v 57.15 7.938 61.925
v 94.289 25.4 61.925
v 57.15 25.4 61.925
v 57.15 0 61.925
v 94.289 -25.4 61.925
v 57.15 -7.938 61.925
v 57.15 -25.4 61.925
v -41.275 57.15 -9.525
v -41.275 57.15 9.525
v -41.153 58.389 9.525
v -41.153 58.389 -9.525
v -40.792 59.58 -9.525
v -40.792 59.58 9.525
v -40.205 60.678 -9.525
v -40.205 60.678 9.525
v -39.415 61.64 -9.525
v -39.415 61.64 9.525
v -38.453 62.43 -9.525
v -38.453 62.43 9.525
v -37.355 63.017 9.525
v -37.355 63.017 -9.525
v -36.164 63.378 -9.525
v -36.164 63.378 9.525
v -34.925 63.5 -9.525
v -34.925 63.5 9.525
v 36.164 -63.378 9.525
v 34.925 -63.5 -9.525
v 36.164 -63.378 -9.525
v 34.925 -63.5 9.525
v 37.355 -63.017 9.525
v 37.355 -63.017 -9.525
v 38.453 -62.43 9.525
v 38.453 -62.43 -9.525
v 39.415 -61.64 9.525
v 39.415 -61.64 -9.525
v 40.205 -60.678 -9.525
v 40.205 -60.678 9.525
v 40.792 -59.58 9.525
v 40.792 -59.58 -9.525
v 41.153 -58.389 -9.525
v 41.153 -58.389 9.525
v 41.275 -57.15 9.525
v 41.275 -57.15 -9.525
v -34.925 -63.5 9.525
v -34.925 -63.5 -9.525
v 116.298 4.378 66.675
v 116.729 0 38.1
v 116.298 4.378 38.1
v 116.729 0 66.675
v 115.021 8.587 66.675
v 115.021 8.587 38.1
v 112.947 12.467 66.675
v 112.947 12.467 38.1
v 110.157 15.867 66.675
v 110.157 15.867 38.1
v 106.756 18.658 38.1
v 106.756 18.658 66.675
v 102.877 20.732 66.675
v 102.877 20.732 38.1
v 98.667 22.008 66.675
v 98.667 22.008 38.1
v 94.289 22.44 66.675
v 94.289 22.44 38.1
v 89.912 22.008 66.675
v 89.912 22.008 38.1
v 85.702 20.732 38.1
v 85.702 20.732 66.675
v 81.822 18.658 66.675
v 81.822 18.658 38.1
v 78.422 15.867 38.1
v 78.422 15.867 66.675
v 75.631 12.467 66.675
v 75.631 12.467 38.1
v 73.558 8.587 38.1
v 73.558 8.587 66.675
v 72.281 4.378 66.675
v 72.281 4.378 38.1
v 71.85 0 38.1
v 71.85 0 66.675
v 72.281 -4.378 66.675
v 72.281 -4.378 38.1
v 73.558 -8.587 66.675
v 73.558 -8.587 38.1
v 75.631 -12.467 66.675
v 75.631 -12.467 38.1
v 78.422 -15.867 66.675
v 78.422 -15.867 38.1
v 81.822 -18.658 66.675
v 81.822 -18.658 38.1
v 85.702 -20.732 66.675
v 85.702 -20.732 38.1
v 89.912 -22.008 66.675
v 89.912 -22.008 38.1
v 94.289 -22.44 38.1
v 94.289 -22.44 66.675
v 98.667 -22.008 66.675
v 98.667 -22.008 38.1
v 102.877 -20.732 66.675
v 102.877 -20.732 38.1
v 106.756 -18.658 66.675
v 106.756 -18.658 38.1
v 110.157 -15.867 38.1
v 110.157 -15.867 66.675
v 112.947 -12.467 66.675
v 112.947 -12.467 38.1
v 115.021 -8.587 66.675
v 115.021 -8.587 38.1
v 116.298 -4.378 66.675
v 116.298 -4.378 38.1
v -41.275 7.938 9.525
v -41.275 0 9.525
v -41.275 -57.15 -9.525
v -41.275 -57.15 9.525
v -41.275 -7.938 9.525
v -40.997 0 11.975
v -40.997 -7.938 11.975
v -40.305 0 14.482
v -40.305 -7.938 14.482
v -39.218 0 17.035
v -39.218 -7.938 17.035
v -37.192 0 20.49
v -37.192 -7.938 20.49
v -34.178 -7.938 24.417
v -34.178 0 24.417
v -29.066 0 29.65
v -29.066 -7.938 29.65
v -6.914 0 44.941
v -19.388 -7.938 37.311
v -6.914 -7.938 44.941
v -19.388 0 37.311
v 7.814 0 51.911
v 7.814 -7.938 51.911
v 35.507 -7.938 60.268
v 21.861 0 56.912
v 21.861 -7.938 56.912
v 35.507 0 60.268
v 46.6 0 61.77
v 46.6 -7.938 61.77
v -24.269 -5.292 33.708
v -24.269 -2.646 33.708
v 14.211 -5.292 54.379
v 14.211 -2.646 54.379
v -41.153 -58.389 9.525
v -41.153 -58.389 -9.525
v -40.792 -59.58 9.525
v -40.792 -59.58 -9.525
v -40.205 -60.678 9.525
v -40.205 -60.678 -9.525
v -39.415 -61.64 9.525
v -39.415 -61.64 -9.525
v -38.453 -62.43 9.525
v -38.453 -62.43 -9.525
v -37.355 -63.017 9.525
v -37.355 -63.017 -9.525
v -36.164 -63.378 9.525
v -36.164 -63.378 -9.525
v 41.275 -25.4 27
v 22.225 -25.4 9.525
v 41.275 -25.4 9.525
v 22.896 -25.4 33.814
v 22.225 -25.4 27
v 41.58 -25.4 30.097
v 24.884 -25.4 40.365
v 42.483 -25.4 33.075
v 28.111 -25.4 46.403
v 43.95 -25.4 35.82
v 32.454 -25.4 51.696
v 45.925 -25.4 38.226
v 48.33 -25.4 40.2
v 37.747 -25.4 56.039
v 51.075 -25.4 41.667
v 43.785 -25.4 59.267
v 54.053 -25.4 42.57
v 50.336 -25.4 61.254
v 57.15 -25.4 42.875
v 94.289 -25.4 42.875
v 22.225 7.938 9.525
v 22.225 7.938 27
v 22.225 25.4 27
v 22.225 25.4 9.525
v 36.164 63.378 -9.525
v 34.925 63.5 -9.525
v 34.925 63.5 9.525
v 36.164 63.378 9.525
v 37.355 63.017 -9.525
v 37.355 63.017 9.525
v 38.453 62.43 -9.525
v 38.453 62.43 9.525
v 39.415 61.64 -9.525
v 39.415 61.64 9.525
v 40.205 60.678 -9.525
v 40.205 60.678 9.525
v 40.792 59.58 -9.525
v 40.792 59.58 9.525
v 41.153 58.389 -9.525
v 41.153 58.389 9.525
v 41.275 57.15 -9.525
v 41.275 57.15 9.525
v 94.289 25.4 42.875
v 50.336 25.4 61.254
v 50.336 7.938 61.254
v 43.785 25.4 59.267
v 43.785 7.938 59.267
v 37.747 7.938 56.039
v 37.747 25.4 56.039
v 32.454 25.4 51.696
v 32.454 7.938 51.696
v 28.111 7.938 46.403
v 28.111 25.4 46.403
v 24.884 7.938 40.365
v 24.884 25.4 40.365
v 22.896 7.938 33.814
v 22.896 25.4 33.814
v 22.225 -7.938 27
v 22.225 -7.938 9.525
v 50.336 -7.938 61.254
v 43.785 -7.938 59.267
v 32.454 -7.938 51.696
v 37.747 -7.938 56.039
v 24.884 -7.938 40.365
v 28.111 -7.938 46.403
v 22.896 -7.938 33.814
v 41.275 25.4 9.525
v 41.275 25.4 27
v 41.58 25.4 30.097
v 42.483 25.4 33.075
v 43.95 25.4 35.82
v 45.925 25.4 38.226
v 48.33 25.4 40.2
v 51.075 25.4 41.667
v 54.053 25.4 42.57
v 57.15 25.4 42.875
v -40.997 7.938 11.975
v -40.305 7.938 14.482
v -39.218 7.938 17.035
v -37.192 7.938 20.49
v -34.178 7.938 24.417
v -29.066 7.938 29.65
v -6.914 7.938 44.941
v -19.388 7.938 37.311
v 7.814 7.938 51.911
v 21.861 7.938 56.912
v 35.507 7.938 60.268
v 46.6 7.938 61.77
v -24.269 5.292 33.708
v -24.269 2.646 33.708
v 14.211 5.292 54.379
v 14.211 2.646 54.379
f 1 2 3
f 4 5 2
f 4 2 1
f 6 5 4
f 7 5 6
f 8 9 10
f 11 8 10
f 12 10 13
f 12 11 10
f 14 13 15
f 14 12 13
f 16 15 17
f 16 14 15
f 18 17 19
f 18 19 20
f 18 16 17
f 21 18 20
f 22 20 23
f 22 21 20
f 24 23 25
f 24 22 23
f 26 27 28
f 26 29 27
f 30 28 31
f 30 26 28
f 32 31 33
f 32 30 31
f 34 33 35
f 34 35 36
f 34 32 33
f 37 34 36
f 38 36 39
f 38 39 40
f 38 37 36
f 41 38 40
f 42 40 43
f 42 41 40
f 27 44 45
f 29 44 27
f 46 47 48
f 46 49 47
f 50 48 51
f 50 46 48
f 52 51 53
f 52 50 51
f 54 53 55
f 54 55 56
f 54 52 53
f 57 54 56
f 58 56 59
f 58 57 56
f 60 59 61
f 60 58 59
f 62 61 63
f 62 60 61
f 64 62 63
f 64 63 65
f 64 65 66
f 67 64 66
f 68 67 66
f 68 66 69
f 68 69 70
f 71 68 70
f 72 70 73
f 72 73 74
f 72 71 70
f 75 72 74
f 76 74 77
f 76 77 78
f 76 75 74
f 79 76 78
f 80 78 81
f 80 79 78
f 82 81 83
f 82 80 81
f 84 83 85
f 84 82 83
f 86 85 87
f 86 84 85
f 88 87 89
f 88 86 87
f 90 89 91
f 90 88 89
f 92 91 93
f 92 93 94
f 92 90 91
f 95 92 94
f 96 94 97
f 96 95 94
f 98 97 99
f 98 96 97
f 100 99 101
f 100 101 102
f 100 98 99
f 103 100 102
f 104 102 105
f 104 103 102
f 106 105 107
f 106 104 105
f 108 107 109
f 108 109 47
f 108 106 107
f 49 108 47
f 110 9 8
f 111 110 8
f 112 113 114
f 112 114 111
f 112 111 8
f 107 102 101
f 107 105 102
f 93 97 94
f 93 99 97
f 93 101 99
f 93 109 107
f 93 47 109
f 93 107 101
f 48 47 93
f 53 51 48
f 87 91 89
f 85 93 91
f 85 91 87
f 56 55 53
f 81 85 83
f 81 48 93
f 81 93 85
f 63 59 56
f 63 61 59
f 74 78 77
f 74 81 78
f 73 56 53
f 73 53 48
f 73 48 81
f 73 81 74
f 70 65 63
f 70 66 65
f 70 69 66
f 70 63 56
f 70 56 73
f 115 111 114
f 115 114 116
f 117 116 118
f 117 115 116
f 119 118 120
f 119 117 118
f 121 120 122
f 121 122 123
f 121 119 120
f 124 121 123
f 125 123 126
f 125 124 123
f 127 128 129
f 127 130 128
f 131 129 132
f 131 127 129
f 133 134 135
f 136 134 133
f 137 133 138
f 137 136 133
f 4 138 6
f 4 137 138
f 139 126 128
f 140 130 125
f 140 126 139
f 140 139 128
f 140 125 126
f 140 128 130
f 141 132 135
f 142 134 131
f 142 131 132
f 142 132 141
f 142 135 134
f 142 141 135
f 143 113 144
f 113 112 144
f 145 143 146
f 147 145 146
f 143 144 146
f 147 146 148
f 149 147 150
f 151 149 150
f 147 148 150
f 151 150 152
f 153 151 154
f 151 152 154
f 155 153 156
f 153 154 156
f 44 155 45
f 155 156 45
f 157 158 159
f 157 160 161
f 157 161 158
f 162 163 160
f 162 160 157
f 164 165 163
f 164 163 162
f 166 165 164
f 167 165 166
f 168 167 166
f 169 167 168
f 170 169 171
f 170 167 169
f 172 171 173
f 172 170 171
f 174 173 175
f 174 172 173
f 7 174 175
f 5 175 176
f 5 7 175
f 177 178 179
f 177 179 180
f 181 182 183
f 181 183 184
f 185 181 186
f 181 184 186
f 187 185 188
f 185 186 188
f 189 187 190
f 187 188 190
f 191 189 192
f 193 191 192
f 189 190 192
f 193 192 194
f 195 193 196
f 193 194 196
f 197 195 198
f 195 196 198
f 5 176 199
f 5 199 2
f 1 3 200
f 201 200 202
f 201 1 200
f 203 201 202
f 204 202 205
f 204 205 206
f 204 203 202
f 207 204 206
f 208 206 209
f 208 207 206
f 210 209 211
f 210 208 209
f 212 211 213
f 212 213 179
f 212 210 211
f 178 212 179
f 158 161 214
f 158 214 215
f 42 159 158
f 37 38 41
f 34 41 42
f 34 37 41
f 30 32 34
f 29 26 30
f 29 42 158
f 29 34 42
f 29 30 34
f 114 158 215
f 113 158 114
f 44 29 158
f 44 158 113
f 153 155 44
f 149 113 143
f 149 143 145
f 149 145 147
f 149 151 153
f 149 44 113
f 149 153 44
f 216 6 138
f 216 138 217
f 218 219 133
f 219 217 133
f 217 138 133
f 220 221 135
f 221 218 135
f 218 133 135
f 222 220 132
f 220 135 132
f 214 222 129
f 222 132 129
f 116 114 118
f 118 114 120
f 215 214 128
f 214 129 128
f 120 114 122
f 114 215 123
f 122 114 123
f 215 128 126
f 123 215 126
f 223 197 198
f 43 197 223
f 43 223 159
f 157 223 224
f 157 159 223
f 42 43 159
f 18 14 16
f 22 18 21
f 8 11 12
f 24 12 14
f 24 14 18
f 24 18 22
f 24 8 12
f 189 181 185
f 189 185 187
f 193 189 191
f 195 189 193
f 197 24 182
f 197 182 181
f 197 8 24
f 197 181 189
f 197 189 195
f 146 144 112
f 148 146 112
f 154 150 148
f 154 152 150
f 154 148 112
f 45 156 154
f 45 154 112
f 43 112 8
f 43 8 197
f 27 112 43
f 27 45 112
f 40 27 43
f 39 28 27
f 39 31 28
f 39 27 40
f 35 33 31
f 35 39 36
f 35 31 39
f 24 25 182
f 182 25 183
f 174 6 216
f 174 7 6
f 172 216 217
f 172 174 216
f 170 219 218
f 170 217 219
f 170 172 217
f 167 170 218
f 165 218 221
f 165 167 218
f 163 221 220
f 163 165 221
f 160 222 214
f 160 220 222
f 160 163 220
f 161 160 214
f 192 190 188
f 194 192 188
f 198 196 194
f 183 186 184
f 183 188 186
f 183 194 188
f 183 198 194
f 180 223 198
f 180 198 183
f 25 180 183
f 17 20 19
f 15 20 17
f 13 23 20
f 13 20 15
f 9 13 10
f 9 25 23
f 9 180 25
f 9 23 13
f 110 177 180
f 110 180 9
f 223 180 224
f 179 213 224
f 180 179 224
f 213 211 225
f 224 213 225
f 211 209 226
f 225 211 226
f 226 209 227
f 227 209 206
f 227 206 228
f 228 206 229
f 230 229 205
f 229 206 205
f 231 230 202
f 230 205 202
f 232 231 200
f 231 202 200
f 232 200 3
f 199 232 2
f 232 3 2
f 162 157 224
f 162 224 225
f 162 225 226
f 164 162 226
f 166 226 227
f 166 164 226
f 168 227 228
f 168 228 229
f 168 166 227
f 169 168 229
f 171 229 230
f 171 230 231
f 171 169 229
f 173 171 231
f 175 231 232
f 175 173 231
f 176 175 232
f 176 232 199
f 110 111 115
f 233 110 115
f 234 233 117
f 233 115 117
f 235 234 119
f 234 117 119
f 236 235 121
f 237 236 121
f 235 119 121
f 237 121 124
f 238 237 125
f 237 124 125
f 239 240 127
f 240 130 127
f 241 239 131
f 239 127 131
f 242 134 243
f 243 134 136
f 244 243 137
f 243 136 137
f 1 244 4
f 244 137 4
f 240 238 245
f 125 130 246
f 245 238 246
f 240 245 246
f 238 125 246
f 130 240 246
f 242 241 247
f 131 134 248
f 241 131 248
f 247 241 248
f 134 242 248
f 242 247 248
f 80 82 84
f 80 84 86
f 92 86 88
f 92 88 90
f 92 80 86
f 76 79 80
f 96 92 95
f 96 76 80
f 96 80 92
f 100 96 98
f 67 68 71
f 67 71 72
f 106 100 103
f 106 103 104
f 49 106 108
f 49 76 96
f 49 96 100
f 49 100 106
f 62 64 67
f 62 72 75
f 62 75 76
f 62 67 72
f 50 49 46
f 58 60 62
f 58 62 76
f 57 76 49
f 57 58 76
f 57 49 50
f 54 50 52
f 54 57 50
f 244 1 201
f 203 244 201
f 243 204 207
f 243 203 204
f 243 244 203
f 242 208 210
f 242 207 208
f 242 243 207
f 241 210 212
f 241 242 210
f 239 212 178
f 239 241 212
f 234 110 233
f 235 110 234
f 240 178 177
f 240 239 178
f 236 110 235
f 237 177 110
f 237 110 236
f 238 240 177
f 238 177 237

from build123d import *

# Parameters (mm, degrees)
F1_DEPTH = 63.5
F0_W     = 28.3603538342
F0_H     = 19.05
F2_DEPTH = 25.4
F3_DEPTH = 7.9375
F5_R     = 6.35


with BuildPart() as f1:
    # F0 (on Front) → F1 (new body, symmetric)
    with BuildSketch(Plane.XZ):
        Polygon((-41.275, 9.525), (-41.275, -9.525), (41.275, -9.525), (41.275, 9.525), (22.225, 9.525), align=None)
    extrude(amount=F1_DEPTH, both=True)

    # F0 (on Front) → F2 (join, symmetric)
    with BuildSketch(Plane.XZ):
        with BuildLine():
            Line((22.225, 9.525), (41.275, 9.525))
            Line((41.275, 9.525), (41.275, 27.0002))
            ThreePointArc((41.275, 27.0002), (45.9246798487, 38.2255201513), (57.15, 42.8752))
            Line((57.15, 42.8752), (65.9289314961, 42.8752))
            Line((65.9289314961, 42.8752), (65.9289314961, 61.9252))
            Line((65.9289314961, 61.9252), (57.15, 61.9252))
            ThreePointArc((57.15, 61.9252), (32.4542956671, 51.6959043329), (22.225, 27.0002))
            Line((22.225, 27.0002), (22.225, 9.525))
        make_face()
        with Locations((80.1091084132, 52.4002)):
            Rectangle(F0_W, F0_H)
    extrude(amount=F2_DEPTH, both=True)

    # F0 (on Front) → F3 (join, symmetric)
    with BuildSketch(Plane.XZ):
        with BuildLine():
            add(Edge.make_bspline(
                [(-41.275, 9.525), (-40.676958859, 32.2595275939), (17.6535416394, 64.1468688846), (57.15, 61.9252)],
                knots=[0, 0, 0, 0, 111.5045361635, 111.5045361635, 111.5045361635, 111.5045361635], degree=3))
            Line((-41.275, 9.525), (22.225, 9.525))
            Line((22.225, 9.525), (22.225, 27.0002))
            ThreePointArc((22.225, 27.0002), (32.4542956671, 51.6959043329), (57.15, 61.9252))
        make_face()
    extrude(amount=F3_DEPTH, both=True)

    # F5
    f5_edges = [f1.edges().sort_by_distance(p)[0] for p in [
        (41.275, -63.5, 0),
        (-41.275, -63.5, 0),
        (41.275, 63.5, 0),
        (-41.275, 63.5, 0),
    ]]
    fillet(f5_edges, radius=F5_R)


with BuildPart() as f4:
    # F0 (on Front) → F4 (revolve)
    with BuildSketch(Plane.XZ):
        Polygon((94.2892853303, 66.675), (94.2892853303, 61.9252), (94.2892853303, 42.8752), (94.2892853303, 38.1), (116.7289314961, 38.1), (116.7289314961, 66.675), align=None)
    revolve(axis=Axis((94.2892853303, 0, 52.3875), (0, 0, 1)))


solid = Compound([f1.part, f4.part])
